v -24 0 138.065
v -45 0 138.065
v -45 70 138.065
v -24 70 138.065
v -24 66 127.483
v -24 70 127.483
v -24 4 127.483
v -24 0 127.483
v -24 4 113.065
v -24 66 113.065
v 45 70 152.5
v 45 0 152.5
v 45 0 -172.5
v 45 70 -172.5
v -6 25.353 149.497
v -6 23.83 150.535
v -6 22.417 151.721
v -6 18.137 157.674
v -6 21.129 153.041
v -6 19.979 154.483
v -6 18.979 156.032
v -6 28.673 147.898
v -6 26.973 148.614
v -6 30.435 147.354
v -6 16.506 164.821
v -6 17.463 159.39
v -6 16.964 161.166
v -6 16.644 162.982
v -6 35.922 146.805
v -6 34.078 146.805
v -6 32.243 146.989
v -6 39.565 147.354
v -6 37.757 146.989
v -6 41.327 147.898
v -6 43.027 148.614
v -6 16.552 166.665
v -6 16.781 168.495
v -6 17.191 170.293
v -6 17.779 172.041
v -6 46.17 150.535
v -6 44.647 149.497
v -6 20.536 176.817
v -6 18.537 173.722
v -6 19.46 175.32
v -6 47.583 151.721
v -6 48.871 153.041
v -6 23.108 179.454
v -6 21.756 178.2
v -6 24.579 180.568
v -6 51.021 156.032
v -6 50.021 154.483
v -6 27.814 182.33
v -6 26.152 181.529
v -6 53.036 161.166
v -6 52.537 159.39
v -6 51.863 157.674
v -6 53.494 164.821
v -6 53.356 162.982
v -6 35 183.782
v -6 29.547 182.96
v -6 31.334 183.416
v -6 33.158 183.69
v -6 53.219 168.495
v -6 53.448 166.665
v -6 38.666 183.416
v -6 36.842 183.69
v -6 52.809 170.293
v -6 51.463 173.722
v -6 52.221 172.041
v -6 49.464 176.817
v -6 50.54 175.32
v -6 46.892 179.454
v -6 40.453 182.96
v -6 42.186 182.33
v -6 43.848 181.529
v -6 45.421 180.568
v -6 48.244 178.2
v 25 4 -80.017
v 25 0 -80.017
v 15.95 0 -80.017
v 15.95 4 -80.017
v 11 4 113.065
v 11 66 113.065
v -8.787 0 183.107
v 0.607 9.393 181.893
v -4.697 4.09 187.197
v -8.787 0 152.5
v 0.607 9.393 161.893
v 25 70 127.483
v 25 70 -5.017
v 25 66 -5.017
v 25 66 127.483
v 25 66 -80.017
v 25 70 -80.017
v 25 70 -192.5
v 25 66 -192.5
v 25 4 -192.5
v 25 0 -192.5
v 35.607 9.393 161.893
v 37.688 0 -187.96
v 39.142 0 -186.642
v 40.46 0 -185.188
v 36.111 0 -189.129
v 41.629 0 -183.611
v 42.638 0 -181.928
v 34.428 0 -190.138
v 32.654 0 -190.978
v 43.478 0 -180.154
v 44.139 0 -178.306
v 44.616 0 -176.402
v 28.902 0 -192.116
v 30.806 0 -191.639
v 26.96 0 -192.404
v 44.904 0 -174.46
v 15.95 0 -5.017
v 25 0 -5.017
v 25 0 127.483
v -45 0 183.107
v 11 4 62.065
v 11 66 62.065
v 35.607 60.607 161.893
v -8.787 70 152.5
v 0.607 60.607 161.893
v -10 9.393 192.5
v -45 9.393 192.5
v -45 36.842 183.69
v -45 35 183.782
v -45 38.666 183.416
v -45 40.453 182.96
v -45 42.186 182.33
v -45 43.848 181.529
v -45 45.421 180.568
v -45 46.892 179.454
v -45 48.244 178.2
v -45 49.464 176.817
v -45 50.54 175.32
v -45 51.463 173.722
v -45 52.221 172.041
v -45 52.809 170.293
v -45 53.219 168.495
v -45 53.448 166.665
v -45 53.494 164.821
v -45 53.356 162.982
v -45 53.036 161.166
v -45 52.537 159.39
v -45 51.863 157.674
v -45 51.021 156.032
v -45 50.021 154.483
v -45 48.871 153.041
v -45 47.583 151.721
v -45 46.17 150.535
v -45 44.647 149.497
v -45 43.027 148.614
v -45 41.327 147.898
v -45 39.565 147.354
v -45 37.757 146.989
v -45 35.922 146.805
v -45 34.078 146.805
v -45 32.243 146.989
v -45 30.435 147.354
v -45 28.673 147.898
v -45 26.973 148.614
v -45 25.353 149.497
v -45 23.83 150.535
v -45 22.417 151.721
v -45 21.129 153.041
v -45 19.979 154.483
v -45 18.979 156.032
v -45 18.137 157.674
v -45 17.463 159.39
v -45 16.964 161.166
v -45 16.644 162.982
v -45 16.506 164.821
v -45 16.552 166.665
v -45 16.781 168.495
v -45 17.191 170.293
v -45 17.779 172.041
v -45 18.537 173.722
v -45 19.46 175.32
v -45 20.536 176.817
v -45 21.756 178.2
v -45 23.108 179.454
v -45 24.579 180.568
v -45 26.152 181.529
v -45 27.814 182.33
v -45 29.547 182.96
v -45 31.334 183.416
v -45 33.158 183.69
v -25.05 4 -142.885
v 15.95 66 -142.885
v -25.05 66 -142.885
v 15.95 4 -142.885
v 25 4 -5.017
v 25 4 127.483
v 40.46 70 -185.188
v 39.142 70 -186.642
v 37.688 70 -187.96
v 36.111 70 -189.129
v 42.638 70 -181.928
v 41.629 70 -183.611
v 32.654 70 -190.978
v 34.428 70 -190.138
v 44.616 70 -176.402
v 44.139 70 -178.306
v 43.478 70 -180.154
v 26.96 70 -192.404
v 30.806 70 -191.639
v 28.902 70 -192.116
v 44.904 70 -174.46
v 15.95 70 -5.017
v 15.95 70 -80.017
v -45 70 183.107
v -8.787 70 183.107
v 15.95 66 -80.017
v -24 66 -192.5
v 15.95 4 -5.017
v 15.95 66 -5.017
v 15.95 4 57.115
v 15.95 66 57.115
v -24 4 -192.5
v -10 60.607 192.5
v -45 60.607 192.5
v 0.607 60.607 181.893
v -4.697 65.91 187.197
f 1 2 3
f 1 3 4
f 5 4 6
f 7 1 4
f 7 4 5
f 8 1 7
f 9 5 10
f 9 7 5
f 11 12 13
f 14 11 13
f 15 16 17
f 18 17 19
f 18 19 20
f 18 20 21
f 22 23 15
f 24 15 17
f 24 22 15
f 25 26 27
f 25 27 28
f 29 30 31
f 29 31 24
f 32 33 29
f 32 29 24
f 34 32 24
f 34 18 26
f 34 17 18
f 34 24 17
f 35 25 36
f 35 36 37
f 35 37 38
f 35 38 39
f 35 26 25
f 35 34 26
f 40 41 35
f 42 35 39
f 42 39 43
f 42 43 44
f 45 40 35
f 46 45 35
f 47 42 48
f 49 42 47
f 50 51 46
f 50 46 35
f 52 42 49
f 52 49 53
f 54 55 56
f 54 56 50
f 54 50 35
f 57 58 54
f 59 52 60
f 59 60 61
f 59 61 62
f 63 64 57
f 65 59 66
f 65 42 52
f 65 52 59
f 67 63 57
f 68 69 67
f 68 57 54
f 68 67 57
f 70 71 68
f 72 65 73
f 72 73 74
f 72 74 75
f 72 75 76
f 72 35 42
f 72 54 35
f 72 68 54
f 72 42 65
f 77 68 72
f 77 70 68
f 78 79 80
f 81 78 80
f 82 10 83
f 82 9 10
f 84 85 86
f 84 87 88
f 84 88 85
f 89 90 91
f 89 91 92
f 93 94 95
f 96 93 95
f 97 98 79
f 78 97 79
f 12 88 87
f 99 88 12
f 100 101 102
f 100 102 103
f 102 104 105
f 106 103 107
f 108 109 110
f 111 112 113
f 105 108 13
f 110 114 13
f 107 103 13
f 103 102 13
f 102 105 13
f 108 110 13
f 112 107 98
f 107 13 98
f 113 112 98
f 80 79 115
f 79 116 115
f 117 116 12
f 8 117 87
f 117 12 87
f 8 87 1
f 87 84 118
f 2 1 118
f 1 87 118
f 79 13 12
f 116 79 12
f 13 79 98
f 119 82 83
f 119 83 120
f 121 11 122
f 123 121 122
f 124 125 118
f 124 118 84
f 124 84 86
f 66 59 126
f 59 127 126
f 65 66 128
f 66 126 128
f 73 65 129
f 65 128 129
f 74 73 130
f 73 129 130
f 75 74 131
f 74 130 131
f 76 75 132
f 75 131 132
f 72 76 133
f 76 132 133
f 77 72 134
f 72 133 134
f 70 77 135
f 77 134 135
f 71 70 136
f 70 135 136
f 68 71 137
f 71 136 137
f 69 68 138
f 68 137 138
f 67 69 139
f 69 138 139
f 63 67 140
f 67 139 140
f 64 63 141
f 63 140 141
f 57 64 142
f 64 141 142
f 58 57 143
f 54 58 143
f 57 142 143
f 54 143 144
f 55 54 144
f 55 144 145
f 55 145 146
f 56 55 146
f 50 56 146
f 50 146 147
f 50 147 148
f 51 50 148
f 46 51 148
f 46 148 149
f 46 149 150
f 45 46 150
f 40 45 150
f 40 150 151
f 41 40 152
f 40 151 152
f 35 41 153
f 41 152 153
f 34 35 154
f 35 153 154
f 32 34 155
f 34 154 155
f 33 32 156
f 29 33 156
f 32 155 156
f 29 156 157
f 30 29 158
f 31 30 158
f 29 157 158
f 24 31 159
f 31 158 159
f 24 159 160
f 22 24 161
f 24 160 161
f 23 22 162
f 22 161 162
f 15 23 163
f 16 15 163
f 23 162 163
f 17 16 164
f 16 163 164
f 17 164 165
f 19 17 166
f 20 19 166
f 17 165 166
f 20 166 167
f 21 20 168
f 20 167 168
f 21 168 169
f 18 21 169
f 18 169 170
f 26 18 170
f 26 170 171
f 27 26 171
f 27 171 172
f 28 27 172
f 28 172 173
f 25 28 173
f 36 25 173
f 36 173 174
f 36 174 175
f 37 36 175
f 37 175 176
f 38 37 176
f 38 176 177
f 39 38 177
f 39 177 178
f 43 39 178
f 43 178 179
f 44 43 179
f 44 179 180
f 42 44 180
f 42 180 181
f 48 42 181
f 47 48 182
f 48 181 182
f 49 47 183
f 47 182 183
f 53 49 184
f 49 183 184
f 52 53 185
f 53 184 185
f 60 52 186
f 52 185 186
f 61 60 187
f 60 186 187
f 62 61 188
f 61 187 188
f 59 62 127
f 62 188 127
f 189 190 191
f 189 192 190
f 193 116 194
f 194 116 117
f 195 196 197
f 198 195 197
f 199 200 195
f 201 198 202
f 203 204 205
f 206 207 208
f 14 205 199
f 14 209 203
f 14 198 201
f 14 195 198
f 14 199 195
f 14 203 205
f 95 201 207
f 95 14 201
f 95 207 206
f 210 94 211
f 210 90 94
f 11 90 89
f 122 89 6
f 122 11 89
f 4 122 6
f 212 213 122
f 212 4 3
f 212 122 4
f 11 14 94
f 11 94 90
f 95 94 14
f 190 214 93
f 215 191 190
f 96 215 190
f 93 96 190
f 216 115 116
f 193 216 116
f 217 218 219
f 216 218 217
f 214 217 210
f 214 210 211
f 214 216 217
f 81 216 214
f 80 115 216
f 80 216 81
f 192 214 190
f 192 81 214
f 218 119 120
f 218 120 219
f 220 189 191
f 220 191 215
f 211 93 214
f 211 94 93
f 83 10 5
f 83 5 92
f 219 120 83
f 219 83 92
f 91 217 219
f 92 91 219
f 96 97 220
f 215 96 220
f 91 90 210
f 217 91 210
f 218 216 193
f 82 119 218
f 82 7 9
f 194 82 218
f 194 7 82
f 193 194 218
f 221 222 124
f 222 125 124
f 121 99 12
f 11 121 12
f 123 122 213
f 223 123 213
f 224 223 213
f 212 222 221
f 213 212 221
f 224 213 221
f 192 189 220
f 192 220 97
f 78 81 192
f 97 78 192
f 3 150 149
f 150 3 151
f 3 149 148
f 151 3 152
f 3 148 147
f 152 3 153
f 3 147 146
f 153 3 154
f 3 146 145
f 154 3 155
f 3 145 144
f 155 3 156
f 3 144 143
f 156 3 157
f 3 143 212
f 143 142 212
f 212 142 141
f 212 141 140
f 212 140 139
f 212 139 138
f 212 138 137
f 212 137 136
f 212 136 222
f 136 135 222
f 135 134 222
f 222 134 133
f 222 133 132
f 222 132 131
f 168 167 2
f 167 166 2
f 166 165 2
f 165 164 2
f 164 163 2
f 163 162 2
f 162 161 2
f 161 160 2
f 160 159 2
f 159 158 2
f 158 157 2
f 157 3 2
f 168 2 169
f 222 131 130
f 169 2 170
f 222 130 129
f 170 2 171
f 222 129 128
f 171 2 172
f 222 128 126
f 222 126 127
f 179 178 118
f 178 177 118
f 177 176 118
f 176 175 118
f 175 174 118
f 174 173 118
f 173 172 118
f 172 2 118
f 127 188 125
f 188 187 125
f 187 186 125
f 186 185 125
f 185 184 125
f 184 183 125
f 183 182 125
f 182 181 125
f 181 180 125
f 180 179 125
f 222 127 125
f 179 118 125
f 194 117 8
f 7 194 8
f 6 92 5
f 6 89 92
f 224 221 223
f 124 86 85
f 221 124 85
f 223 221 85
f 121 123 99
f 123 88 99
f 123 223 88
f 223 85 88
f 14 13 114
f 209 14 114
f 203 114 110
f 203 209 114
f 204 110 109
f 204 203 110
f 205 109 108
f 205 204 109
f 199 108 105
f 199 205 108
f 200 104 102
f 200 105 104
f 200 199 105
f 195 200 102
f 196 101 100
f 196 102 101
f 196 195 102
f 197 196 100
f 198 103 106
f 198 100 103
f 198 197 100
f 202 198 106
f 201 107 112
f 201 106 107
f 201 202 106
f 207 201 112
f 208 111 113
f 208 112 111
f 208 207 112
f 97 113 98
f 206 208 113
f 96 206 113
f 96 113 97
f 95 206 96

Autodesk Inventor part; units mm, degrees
ref_plane "YZ Plane" through (0, 0, 0) normal (1, 0, 0) x (0, 1, 0)
ref_plane "XZ Plane" through (0, 0, 0) normal (0, 1, 0) x (-1, 0, 0)
ref_plane "XY Plane" through (0, 0, 0) normal (0, 0, 1) x (1, 0, 0)
sketch "Sketch1" plane through (0, 0, 0) normal (0, 1, 0) x (-1, 0, 0)
  line L0 (45, 192.5) -> (-45, 192.5)
  line L1 (-45, 192.5) -> (-45, -192.5)
  line L2 (-45, -192.5) -> (45, -192.5)
  line L3 (45, -192.5) -> (45, 192.5)
  line L4 (45, 192.5) -> (-45, -192.5) construction
  line L5 (-45, 192.5) -> (45, -192.5) construction
  line L6 (45, 138.0648) -> (24, 138.0648)
  line L7 (24, 138.0648) -> (24, 113.0648)
  line L8 (24, 113.0648) -> (-11, 113.0648)
  line L9 (-11, 113.0648) -> (-11, 62.0648)
  line L10 (-11, 62.0648) -> (-15.9497, 57.115)
  line L11 (-15.9497, 57.115) -> (-15.9497, -142.885)
  line L12 (-15.9497, -142.885) -> (25.0503, -142.885)
  line L13 (25.0503, -142.885) -> (24, -192.5)
  line L14 (-45, 151.0874) -> (10, 151.0874)
  line L15 (10, 151.0874) -> (10, 180.0874)
  line L16 (10, 180.0874) -> (45, 180.0874)
  line L17 (10, 192.5) -> (-0.6066, 181.8934)
  line L18 (-0.6066, 181.8934) -> (-0.6066, 161.8934)
  line L19 (-0.6066, 161.8934) -> (-35.6066, 161.8934)
  line L20 (-35.6066, 161.8934) -> (-46.4126, 151.0874)
  line L21 (-0.6066, 161.8934) -> (10, 151.0874)
  line L22 (10, 180.0874) -> (3.7937, 186.2937)
  point P0 (0, 0)
  point P1 (-45, 152.5)
  dimension "d0" = 90
  dimension "d1" = 385
  dimension "d25" = 21
  dimension "d27" = 25
  dimension "d28" = 35
  dimension "d29" = 51
  dimension "d30" = 7
  dimension "d31" = 135
  dimension "d32" = 200
  dimension "d33" = 41
  dimension "d34" = 55
  dimension "d35" = 29
  dimension "d36" = 15
  dimension "d37" = 20
  dimension "d38" = 35
extrude "Extrusion1" add sketch "Sketch1" along normal blind 70 contours L3 L16 L22 L17 L0 | L3 L6 L7 L8 L9 L10 L11 L12 L13 L2 L1 L14 L15 L16 | L22 L15 L21 L18 L17 | L20 L19 L21 L14 L1
fillet "Fillet1" radius 20 1 edges at (45, 35, -192.5)
sketch "Sketch2" plane through (0, 70, 0) normal (0, 1, 0) x (1, 0, 0)
  arc A0 (45, 172.5) -> (25, 192.5) centre (25, 172.5) ccw projected
  line L0 (45, 172.5) -> (25, 172.5)
  line L1 (25, 172.5) -> (25, -161.8934)
  line L2 (0.6066, -161.8934) -> (35.6066, -161.8934) projected
  line L3 (25, 172.5) -> (25, 192.5171)
  line L4 (25, 192.5171) -> (25, 80.0171)
  line L5 (25, 80.0171) -> (15.9497, 80.0171)
  line L6 (15.9497, 142.885) -> (15.9497, -57.115) projected
  line L7 (25, 80.0171) -> (25, 5.0171)
  line L8 (25, 5.0171) -> (15.9497, 5.0171)
  line L9 (15.9497, 80.0171) -> (15.9497, 5.0171)
  arc A1 (45, 172.5) -> (25, 192.5) centre (25, 172.5) ccw projected
  line L10 (25, 192.5) -> (-24, 192.5) projected
  line L11 (-24, 192.5) -> (-25.0503, 142.885) projected
  line L12 (-25.0503, 142.885) -> (15.9497, 142.885) projected
  line L13 (15.9497, 142.885) -> (15.9497, -57.115) projected
  line L14 (15.9497, -57.115) -> (11, -62.0648) projected
  line L15 (11, -62.0648) -> (11, -113.0648) projected
  line L16 (11, -113.0648) -> (-24, -113.0648) projected
  line L17 (-24, -113.0648) -> (-24, -138.0648) projected
  line L18 (-24, -138.0648) -> (-45, -138.0648) projected
  line L19 (-45, -138.0648) -> (-45, -192.5) projected
  line L20 (45, -152.5) -> (45, 172.5) projected
  line L21 (25, 5.0171) -> (25, -127.4829)
  line L22 (25, -127.4829) -> (-24, -127.4829)
  line L23 (-45, -192.5) -> (-10, -192.5) projected
  line L24 (-10, -192.5) -> (0.6066, -181.8934) projected
  line L25 (0.6066, -181.8934) -> (0.6066, -161.8934) projected
  line L26 (0.6066, -161.8934) -> (35.6066, -161.8934) projected
  line L27 (35.6066, -161.8934) -> (45, -152.5) projected
  point P0 (0, 0)
  dimension "d45" = 112.5
  dimension "d46" = 75
  dimension "d47" = 132.5
extrude "Extrusion2" cut sketch "Sketch2" against normal blind 4 contours L3 L1 L5 L6 L12 L11 L10 | L1 L22 L17 L16 L15 L14 L6 L8
sketch "Sketch3" plane through (0, 0, 0) normal (0, -1, 0) x (1, 0, 0)
  line L0 (25, -192.5) -> (25, -80.0171) projected
  line L1 (25, -80.0171) -> (15.9497, -80.0171) projected
  line L2 (15.9497, -5.0171) -> (25, -5.0171) projected
  line L3 (25, -5.0171) -> (25, 127.4829) projected
  line L4 (25, 127.4829) -> (-24, 127.4829) projected
  arc A0 (25, -192.5) -> (45, -172.5) centre (25, -172.5) ccw projected
  line L5 (45, 152.5) -> (45, -172.5) projected
  line L6 (35.6066, 161.8934) -> (45, 152.5) projected
  line L7 (0.6066, 161.8934) -> (35.6066, 161.8934) projected
  line L8 (0.6066, 181.8934) -> (0.6066, 161.8934) projected
  line L9 (-10, 192.5) -> (0.6066, 181.8934) projected
  line L10 (-45, 192.5) -> (-10, 192.5) projected
  line L11 (-45, 138.0648) -> (-45, 192.5) projected
  line L12 (-24, 138.0648) -> (-45, 138.0648) projected
  line L13 (-24, 113.0648) -> (-24, 138.0648) projected
  line L14 (11, 113.0648) -> (-24, 113.0648) projected
  line L15 (11, 62.0648) -> (11, 113.0648) projected
  line L16 (15.9497, 57.115) -> (11, 62.0648) projected
  line L17 (15.9497, -142.885) -> (15.9497, 57.115) projected
  line L18 (-25.0503, -142.885) -> (15.9497, -142.885) projected
  line L19 (-24, -192.5) -> (-25.0503, -142.885) projected
  line L20 (25, -192.5) -> (-24, -192.5) projected
  point P0 (0, 0)
extrude "Extrusion3" cut sketch "Sketch3" against normal blind 4 contours L20 L19 L18 L17 L1 L0 | L17 L16 L15 L14 L13 L4 L3 L2
chamfer "Chamfer2" distance 9.3934 angle 45 1 edges at (18.1066, 70, 161.8934)
chamfer "Chamfer3" distance 9.3934 angle 45 2 edges at (0.6066, 70, 171.8934) (-27.5, 70, 192.5)
chamfer "Chamfer4" distance 9.3934 angle 45 1 edges at (18.1066, 0, 161.8934)
chamfer "Chamfer5" distance 9.3934 angle 45 2 edges at (0.6066, 0, 171.8934) (-27.5, 0, 192.5)
sketch "Sketch4" plane through (-45, 0, 138.0648) normal (-1, 0, 0) x (0, 0, 1)
  line L0 (0, 0) -> (0, 70) projected
  line L1 (0, 0) -> (54.4352, 70)
  line L2 (0, 70) -> (54.4352, 0)
  circle A0 centre (27.2176, 35) radius 18.5
  point P0 (-138.0648, 0)
  dimension "d64" = 37
extrude "Extrusion4" cut sketch "Sketch4" against normal blind 39 contours A0 L2 L1 | L1 L2 A0 | A0 L1 L2 | L1 A0 L2
